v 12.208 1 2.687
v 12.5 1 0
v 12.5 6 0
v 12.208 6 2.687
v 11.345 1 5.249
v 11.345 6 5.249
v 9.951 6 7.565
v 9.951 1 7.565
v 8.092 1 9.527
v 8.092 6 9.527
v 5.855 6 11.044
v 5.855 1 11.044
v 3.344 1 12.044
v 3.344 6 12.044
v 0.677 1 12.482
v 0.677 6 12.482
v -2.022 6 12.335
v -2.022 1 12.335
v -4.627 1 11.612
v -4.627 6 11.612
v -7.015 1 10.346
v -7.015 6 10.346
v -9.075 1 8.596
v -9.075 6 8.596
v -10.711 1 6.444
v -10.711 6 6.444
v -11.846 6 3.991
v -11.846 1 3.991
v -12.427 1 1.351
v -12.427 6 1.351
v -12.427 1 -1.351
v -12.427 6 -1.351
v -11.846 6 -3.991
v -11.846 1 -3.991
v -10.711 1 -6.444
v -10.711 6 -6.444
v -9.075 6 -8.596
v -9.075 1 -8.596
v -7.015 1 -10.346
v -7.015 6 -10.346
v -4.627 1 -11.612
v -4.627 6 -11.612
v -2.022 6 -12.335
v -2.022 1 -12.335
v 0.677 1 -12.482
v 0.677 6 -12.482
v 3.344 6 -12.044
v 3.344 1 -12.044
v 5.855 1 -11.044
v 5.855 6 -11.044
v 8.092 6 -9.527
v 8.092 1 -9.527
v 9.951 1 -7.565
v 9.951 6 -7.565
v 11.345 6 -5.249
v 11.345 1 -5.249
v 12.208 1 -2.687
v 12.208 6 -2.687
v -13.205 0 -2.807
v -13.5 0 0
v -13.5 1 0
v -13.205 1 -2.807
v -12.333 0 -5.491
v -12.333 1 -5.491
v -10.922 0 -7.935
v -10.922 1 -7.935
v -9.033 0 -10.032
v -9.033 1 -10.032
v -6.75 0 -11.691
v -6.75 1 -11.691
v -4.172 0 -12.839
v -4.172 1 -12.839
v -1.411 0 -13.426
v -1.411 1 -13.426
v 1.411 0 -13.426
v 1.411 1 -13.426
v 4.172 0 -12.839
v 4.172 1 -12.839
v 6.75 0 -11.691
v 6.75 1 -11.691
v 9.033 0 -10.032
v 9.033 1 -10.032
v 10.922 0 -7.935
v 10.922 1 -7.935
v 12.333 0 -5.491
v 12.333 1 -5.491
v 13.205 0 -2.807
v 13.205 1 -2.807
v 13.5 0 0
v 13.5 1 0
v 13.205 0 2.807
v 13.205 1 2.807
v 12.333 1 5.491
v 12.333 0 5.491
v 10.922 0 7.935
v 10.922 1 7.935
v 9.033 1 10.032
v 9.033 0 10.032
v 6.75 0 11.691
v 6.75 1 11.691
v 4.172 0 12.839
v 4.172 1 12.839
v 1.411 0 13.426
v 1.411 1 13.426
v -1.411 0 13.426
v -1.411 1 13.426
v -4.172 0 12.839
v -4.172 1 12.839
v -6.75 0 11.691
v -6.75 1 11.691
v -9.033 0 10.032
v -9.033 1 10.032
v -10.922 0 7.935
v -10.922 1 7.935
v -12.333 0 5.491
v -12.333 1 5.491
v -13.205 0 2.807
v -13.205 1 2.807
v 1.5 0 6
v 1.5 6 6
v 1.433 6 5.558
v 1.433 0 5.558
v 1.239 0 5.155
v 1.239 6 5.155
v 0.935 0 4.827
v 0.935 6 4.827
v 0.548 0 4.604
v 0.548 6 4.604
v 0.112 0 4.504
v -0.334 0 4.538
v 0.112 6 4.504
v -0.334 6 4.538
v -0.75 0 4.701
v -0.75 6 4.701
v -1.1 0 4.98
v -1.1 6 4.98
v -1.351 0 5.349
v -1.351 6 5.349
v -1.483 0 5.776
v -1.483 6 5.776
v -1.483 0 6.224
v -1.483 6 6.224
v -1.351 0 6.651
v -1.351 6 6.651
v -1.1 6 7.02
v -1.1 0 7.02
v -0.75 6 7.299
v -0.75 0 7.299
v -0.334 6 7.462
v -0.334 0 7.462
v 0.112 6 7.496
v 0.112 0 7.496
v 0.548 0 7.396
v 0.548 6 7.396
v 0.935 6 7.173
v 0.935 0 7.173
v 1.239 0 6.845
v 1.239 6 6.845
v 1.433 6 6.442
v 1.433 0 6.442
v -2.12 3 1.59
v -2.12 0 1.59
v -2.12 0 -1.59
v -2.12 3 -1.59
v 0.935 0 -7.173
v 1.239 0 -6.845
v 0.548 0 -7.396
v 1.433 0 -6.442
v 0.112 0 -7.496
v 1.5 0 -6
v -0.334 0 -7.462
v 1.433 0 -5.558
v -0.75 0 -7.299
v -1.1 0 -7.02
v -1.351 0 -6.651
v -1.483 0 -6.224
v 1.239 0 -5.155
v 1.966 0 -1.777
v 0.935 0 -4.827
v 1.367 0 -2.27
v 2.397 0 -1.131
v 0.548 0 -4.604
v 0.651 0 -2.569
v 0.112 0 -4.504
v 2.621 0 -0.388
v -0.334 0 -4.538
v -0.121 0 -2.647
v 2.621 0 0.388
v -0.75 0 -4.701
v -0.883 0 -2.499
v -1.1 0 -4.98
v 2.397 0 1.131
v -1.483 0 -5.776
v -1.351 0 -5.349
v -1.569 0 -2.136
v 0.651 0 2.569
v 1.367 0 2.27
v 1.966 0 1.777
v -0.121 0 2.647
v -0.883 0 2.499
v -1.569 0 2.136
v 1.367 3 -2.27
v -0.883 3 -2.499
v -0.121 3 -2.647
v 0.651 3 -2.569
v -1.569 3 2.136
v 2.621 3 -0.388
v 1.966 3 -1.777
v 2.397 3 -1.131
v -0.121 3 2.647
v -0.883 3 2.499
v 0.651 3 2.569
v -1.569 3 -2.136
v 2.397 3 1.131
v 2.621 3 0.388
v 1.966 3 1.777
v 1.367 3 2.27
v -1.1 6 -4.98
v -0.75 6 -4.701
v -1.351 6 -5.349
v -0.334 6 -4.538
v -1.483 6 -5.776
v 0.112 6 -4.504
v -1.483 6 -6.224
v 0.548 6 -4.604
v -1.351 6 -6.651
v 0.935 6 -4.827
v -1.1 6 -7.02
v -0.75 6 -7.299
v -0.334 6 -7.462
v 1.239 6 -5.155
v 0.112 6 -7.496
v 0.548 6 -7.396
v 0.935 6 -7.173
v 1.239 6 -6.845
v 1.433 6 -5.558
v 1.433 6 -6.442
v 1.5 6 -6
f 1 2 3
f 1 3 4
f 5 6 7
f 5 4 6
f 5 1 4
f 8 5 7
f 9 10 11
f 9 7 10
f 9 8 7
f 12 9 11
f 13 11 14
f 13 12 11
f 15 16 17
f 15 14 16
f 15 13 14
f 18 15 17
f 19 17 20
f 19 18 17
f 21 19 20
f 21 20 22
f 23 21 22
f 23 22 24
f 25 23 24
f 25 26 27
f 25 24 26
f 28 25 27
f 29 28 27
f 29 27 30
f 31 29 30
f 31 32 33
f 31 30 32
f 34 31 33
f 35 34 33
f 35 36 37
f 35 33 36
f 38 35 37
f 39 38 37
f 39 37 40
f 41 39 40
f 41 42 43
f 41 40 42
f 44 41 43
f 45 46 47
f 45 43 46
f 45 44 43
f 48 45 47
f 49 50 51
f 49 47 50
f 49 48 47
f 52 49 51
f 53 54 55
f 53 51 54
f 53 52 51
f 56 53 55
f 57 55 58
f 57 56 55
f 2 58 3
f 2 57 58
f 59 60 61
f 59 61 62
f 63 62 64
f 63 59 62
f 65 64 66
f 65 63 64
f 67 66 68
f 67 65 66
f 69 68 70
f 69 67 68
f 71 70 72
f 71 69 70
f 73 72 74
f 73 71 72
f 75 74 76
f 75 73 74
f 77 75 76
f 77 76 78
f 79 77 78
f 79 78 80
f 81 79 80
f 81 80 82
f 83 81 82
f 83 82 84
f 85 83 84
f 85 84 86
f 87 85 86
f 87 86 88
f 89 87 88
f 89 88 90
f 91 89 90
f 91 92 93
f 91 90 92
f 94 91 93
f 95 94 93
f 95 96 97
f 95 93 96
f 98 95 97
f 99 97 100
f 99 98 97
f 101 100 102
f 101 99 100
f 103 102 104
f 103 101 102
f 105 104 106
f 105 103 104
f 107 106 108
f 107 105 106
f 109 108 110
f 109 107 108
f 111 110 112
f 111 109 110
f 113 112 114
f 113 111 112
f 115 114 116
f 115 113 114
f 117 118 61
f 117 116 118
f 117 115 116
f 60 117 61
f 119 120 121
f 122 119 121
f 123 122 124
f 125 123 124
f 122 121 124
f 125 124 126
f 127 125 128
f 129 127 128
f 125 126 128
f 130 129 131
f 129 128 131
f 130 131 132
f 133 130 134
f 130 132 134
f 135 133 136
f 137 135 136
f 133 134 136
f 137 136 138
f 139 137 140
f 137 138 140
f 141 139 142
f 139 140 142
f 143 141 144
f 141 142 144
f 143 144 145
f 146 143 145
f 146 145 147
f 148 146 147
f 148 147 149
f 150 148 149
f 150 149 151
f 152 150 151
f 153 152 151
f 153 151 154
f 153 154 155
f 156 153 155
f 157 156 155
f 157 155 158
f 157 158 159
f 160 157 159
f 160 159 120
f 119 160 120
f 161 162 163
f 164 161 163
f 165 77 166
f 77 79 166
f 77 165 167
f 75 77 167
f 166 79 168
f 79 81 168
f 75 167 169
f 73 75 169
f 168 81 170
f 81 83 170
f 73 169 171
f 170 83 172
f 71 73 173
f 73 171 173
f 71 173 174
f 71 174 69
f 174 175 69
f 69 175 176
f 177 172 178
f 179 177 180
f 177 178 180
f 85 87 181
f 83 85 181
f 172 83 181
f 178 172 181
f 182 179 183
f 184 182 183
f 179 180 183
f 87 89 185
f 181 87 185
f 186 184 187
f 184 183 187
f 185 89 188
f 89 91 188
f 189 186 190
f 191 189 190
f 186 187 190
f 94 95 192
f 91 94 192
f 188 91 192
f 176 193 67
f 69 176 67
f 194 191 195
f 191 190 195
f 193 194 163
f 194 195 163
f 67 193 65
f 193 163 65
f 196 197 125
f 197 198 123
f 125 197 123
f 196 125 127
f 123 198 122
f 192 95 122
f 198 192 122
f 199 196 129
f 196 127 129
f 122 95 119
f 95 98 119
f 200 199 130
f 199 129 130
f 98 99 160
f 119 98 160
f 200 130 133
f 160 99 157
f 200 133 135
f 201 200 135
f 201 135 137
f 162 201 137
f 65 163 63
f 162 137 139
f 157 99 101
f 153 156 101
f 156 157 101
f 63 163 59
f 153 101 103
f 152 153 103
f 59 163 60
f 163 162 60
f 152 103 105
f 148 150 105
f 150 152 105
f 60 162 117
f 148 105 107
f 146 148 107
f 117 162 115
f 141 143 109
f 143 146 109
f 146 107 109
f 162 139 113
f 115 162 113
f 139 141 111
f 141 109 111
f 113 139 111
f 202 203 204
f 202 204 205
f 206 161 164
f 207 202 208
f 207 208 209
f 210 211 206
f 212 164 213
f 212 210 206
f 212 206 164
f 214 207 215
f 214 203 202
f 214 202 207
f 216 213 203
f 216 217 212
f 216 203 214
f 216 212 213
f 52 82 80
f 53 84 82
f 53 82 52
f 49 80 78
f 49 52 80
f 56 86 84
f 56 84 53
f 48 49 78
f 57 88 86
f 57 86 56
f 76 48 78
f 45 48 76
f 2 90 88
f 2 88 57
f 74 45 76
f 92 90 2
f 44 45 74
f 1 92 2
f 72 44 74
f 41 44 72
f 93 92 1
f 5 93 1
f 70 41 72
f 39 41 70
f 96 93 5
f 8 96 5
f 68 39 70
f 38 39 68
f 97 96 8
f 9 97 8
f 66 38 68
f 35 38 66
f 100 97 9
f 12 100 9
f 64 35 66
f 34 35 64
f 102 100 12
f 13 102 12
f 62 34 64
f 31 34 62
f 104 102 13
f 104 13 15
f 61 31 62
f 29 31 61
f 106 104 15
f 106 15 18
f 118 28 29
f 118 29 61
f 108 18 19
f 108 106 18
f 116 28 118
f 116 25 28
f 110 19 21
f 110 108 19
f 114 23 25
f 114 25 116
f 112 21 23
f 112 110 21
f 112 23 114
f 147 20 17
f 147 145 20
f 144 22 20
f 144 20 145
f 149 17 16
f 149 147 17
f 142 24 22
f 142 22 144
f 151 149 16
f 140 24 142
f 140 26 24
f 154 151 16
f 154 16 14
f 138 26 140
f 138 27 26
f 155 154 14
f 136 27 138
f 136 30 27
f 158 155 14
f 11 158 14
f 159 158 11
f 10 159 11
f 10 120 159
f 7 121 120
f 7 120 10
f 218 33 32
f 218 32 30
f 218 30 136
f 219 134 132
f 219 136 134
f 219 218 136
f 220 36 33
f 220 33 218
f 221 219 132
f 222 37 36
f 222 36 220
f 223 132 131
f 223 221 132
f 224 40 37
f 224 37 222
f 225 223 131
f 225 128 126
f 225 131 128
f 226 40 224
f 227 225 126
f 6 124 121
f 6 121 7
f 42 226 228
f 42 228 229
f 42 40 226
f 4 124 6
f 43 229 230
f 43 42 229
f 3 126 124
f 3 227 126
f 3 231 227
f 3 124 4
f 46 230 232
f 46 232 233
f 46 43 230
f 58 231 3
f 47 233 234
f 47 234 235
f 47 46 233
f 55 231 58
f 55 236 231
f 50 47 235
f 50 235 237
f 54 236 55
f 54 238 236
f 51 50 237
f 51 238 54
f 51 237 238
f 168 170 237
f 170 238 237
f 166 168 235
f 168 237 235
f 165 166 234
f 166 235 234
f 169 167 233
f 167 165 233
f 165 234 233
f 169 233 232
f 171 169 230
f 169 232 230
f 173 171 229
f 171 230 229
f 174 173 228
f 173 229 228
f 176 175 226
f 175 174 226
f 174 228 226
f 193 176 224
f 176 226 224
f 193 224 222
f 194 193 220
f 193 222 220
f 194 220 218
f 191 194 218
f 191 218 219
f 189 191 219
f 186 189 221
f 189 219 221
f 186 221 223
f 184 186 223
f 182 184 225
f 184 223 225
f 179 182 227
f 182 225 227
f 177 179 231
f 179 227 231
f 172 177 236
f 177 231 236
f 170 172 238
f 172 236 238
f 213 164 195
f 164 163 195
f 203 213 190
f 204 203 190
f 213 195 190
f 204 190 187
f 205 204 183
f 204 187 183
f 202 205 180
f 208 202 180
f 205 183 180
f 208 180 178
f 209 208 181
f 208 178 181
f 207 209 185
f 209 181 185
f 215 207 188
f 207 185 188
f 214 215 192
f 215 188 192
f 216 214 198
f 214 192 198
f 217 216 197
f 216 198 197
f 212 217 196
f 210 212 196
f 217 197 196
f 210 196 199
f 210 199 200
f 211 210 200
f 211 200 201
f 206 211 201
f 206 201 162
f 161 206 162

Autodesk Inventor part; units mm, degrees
ref_plane "YZ Plane" through (0, 0, 0) normal (1, 0, 0) x (0, 1, 0)
ref_plane "XZ Plane" through (0, 0, 0) normal (0, 1, 0) x (-1, 0, 0)
ref_plane "XY Plane" through (0, 0, 0) normal (0, 0, 1) x (1, 0, 0)
sketch "Szkic1" plane through (0, 0, 0) normal (0, 1, 0) x (-1, 0, 0)
  circle A0 centre (0, 0) radius 13.5
  dimension "d0" = 27
extrude "Wyciągnięcie proste1" add sketch "Szkic1" along normal blind 1
sketch "Szkic2" plane through (0, 1, 0) normal (0, 1, 0) x (1, 0, 0)
  circle A0 centre (0, 0) radius 12.5
  dimension "d3" = 25
extrude "Wyciągnięcie proste2" add sketch "Szkic2" along normal blind 5
sketch "Szkic3" plane through (0, 6, 0) normal (0, 1, 0) x (1, 0, 0)
  circle A0 centre (0, -6) radius 1.5
  point P0 (0, 0)
  dimension "d6" = 3
  dimension "d7" = 6
extrude "Wyciągnięcie proste3" cut sketch "Szkic3" against normal up to surface (6 mm away)
mirror "Odbij2" about plane through (0, 0, 0) normal (0, 0, 1) of "Wyciągnięcie proste3"
sketch "Sketch4" plane through (0, 0, 0) normal (0, -1, 0) x (1, 0, 0)
  arc A0 (-2.12, -1.59) -> (-2.12, 1.59) centre (0, 0) ccw
  line L0 (-2.12, 1.59) -> (-2.12, -1.59)
  dimension "d10" = 5.3
  dimension "d11" = 3.18
extrude "Extrusion4" cut sketch "Sketch4" against normal blind 3
properties part number "InputShaft3_3DPrint"
